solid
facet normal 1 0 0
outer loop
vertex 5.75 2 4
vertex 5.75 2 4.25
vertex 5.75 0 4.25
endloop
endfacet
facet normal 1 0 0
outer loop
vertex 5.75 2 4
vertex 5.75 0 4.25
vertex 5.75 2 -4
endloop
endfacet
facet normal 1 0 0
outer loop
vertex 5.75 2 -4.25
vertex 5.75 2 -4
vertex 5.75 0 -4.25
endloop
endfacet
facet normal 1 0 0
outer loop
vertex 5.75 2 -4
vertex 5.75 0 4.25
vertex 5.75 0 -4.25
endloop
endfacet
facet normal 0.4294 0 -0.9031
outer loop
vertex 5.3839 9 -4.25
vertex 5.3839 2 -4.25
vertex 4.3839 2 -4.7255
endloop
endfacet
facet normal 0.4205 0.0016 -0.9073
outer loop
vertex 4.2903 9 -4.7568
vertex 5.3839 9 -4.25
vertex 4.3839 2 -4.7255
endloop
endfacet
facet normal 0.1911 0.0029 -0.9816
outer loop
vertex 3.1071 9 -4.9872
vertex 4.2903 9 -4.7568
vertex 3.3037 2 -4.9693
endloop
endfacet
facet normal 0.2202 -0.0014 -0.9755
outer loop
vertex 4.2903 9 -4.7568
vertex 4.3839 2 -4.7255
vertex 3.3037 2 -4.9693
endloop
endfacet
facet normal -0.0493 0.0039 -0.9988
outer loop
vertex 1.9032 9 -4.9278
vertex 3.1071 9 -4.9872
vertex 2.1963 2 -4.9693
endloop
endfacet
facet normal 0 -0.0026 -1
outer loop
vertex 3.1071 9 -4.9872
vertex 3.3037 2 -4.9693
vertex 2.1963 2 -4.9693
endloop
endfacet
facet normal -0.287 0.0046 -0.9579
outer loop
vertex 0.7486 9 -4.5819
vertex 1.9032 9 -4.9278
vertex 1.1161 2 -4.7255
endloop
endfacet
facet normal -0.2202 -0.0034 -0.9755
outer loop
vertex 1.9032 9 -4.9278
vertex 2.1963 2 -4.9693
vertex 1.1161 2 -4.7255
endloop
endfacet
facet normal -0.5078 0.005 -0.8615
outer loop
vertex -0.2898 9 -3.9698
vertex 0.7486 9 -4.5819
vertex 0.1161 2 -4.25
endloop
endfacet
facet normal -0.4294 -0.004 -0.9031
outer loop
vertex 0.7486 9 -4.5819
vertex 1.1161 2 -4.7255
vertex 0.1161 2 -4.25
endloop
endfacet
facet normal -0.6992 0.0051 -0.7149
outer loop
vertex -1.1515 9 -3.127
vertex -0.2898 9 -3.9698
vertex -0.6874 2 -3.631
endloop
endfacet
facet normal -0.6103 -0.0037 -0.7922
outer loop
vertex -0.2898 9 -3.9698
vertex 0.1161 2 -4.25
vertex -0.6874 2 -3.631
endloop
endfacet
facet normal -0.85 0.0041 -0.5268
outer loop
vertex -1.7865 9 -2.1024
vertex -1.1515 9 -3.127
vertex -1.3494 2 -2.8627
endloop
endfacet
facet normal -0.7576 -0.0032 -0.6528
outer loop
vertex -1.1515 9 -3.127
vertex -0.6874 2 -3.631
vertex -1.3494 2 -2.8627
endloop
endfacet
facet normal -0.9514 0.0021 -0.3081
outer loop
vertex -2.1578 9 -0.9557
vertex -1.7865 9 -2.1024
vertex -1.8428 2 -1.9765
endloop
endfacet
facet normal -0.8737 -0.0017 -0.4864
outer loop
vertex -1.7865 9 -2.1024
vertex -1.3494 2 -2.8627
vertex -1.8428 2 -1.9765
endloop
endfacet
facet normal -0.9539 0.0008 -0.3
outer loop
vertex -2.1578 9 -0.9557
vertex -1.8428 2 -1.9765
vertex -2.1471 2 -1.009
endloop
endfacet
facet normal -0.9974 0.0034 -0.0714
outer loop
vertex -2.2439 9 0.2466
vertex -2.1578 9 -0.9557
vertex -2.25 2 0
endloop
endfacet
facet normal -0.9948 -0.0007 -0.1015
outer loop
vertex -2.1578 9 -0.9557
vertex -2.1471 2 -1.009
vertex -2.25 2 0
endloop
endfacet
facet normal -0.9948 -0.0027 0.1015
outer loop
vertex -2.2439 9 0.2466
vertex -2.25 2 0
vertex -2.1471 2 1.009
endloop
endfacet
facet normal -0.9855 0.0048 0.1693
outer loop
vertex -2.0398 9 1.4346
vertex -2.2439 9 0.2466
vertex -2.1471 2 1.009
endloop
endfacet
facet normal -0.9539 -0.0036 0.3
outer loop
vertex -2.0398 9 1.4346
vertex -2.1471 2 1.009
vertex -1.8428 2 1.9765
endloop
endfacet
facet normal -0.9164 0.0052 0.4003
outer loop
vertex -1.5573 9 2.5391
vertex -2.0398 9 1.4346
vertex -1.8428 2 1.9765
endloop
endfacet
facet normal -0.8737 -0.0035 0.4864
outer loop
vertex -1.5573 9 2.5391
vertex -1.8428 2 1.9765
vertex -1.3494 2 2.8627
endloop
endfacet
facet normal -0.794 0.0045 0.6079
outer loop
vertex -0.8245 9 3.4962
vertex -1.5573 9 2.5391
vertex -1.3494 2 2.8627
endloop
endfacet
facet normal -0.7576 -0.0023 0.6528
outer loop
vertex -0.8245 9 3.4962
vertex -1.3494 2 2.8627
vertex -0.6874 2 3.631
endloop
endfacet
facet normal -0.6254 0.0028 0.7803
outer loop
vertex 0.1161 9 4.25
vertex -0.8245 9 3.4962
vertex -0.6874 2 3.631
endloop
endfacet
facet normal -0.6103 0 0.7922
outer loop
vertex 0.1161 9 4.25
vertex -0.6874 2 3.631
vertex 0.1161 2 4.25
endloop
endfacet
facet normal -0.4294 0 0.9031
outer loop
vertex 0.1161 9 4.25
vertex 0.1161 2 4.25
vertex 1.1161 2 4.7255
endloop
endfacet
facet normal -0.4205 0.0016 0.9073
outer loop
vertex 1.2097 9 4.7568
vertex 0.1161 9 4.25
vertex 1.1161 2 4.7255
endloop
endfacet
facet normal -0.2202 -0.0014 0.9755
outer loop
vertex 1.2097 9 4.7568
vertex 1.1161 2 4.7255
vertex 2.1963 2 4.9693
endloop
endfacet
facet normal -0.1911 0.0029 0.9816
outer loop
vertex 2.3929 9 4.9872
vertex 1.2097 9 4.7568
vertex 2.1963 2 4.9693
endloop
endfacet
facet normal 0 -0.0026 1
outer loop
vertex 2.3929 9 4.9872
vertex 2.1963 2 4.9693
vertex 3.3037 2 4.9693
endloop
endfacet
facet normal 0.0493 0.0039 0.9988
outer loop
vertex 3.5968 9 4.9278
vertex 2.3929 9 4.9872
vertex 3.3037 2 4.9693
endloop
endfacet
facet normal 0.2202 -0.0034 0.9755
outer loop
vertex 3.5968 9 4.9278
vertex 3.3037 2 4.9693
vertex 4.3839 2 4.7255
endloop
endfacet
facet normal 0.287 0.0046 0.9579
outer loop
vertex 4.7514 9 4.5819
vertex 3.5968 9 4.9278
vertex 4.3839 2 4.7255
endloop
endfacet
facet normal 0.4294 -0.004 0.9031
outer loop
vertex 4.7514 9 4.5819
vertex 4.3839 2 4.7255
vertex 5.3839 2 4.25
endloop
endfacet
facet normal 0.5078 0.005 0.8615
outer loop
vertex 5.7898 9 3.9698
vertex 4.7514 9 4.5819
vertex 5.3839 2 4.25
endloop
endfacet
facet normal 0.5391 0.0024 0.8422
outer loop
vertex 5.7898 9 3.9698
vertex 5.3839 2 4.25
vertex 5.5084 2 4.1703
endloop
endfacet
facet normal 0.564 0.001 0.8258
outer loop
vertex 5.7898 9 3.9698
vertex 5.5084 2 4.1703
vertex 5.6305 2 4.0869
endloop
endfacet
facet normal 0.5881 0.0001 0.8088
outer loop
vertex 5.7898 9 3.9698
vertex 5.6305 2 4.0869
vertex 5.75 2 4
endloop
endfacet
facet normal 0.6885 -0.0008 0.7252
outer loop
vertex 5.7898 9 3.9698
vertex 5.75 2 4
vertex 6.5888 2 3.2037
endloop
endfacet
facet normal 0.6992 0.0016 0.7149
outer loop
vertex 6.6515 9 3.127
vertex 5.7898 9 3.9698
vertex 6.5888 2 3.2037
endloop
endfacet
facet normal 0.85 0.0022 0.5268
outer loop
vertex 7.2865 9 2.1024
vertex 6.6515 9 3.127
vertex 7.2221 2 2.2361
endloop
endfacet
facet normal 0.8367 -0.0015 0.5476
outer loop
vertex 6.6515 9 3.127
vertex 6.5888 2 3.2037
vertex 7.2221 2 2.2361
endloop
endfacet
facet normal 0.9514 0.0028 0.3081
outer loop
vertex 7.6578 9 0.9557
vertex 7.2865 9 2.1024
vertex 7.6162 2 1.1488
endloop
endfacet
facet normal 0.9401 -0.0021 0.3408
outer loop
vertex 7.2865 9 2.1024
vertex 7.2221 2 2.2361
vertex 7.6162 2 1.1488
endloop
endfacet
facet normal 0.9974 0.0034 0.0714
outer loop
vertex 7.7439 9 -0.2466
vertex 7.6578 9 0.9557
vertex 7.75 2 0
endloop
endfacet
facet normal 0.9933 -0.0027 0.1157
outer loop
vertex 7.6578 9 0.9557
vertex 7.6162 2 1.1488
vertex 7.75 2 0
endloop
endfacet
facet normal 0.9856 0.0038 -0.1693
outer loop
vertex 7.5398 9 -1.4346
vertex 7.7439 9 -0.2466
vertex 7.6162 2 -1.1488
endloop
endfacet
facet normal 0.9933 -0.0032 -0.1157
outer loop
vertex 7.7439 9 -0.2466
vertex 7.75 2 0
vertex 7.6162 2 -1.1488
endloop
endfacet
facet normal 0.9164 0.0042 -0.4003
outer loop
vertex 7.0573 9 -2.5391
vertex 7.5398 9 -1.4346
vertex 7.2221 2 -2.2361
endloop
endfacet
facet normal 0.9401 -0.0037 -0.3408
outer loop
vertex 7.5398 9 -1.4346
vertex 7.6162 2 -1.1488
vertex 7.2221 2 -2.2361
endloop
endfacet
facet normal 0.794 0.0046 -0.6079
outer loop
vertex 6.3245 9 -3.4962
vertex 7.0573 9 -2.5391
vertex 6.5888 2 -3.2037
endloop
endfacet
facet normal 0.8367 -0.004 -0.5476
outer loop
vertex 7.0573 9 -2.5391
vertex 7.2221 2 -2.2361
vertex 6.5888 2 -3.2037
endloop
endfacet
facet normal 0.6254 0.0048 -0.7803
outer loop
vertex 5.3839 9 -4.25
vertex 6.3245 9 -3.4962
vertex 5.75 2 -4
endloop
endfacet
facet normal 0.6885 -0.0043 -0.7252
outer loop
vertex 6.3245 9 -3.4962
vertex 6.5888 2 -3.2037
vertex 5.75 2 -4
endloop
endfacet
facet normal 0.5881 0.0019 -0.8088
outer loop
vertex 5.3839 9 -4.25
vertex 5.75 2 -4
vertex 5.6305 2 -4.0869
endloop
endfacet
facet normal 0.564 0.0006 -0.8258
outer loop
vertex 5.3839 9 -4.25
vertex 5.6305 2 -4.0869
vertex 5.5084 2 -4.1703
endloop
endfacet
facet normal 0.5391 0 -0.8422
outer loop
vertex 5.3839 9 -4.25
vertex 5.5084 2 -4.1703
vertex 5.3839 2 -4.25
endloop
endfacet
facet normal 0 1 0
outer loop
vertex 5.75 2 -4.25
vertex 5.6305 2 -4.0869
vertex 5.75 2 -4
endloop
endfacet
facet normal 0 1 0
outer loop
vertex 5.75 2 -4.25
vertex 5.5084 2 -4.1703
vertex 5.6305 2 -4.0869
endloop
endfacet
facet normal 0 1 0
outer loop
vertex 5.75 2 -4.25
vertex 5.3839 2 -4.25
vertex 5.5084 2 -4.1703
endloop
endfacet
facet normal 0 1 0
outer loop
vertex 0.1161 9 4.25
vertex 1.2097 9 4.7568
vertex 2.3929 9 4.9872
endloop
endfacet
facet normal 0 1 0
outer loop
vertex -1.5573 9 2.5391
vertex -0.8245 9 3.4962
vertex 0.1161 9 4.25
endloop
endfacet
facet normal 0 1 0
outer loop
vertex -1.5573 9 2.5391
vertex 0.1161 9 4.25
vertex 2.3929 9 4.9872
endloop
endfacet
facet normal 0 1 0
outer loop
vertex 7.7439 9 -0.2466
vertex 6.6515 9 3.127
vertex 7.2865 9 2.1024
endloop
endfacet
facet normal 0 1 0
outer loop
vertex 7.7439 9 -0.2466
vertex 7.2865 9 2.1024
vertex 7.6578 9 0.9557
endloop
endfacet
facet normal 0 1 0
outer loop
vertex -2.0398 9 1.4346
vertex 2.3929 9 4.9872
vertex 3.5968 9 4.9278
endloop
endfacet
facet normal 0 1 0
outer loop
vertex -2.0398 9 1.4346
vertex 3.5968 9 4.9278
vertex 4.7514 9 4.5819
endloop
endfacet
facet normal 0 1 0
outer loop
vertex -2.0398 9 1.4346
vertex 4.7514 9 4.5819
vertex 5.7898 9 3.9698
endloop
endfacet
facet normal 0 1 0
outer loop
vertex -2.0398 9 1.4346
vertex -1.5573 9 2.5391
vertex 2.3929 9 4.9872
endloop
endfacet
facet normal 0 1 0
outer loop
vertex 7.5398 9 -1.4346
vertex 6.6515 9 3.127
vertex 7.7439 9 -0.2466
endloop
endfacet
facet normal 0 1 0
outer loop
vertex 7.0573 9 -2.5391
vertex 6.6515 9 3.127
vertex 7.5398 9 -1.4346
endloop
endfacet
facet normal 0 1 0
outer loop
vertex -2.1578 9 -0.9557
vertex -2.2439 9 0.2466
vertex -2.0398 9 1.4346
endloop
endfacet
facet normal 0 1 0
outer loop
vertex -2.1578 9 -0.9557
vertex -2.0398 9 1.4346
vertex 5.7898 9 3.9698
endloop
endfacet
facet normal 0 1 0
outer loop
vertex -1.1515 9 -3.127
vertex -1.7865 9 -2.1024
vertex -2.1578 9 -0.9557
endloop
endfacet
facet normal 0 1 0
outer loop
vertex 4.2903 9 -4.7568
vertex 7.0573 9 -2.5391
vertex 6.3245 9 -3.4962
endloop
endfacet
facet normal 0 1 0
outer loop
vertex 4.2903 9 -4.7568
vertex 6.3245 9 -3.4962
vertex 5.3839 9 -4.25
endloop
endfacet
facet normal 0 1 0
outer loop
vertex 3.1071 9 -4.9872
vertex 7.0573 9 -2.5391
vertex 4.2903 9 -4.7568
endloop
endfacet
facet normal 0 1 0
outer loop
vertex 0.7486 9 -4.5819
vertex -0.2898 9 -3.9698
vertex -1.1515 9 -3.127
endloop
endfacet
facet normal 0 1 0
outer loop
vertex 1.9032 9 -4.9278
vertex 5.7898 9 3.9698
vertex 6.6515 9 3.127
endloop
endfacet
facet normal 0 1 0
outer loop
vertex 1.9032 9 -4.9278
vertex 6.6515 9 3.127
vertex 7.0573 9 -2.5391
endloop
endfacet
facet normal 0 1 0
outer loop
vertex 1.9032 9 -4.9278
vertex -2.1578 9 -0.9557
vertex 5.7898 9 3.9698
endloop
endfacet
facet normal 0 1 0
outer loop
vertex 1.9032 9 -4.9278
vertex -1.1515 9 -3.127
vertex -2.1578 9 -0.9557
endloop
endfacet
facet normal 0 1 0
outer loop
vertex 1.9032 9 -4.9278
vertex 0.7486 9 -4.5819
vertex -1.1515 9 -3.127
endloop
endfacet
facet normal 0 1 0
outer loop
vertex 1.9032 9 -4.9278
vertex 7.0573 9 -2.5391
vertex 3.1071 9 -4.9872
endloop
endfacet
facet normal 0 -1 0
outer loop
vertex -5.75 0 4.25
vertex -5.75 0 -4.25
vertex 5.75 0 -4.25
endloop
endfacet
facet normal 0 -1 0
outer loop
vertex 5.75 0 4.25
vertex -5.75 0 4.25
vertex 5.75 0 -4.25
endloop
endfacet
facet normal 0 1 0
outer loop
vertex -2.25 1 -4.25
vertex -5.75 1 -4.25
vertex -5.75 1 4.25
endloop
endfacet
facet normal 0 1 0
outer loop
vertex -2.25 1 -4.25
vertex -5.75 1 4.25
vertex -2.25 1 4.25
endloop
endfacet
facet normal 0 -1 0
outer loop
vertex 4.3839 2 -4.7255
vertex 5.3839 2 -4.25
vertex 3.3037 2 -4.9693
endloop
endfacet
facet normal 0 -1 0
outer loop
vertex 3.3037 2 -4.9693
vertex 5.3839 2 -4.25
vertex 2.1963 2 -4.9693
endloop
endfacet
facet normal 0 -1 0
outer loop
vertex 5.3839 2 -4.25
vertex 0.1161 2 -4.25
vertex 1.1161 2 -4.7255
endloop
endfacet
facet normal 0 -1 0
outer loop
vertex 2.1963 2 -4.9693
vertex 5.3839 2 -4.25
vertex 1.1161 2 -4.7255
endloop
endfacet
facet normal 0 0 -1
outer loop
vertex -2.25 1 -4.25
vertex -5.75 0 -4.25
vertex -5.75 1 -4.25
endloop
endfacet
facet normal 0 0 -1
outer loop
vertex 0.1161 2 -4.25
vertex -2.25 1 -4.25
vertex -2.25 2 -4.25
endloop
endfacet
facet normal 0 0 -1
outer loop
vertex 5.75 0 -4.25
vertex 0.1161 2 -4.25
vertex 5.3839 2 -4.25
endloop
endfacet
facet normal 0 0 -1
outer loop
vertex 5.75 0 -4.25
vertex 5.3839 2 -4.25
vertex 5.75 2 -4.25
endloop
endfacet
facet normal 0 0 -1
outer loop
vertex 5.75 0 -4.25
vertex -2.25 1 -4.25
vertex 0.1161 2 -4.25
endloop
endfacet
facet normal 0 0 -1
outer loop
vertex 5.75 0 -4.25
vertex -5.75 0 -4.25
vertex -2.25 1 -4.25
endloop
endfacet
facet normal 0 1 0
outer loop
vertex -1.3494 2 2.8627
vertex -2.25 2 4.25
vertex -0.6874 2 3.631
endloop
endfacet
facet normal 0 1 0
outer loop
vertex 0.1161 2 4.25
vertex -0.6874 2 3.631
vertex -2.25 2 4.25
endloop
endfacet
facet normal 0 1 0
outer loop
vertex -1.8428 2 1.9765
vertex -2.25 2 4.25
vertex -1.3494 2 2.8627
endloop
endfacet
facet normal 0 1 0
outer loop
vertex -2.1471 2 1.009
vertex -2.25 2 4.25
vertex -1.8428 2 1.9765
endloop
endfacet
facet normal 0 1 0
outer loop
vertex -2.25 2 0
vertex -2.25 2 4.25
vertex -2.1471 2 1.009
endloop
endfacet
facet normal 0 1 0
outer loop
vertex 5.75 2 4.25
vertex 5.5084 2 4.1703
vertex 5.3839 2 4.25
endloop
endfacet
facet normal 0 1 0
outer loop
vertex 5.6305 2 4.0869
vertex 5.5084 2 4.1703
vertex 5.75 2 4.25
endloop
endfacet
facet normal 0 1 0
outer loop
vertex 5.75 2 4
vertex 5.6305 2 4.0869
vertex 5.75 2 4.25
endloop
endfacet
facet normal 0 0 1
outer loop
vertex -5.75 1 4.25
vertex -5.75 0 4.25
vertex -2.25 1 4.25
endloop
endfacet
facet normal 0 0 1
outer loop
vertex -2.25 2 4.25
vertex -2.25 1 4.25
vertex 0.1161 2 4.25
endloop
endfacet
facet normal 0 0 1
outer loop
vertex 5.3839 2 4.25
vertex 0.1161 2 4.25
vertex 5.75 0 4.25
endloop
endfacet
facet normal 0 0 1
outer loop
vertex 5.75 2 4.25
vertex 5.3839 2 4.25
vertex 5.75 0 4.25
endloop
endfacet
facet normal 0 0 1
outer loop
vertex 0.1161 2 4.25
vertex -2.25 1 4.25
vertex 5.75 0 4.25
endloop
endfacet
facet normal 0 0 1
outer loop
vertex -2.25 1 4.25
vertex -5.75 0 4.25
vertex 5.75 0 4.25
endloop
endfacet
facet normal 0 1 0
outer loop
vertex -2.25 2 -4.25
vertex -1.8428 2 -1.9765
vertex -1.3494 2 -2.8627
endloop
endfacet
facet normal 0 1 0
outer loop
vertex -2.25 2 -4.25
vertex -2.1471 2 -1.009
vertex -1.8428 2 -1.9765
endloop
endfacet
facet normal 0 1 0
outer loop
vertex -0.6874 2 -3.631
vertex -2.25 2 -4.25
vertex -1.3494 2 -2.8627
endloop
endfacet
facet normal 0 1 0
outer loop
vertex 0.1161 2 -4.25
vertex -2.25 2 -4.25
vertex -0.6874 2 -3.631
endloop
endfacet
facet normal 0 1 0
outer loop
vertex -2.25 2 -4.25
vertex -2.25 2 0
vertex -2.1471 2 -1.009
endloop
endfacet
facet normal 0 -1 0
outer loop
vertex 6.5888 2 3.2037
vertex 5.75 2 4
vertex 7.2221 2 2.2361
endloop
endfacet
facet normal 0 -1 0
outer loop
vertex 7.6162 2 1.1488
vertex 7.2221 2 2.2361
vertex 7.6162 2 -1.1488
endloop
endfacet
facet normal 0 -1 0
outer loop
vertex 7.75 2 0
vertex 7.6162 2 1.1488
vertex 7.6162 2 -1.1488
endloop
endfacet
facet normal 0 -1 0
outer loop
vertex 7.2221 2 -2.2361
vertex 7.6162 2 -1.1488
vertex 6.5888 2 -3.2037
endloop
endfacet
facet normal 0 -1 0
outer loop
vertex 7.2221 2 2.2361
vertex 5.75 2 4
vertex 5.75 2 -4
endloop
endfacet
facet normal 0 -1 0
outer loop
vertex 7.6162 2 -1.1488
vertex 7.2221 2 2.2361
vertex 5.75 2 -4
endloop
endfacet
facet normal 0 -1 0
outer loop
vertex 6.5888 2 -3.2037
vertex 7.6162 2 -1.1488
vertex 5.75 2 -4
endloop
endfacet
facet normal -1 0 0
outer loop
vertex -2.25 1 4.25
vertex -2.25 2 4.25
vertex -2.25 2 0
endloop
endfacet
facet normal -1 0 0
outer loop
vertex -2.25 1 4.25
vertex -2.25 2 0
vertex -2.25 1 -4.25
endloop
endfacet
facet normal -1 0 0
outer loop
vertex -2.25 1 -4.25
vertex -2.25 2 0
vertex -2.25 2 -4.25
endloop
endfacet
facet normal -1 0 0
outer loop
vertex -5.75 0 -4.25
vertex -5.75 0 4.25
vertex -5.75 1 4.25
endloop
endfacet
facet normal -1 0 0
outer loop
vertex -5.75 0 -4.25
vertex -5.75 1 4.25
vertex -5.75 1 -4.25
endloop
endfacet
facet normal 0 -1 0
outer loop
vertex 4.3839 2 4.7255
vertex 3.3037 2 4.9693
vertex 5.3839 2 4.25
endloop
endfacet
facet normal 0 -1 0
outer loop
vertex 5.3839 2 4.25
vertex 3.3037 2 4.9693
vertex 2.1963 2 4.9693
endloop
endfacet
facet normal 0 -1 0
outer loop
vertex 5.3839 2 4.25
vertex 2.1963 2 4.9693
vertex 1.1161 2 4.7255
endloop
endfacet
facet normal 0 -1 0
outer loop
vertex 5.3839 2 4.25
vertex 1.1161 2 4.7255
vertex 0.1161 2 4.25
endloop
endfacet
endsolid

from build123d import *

# Parameters (mm, degrees)
SKETCH1_W           = 11.5
SKETCH1_H           = 8.5
BOSS_EXTRUDE1_DEPTH = 2
SKETCH2_R           = 5
BOSS_EXTRUDE2_DEPTH = 7
SKETCH3_W           = 3.5
SKETCH3_H           = 8.5
CUT_EXTRUDE1_DEPTH  = 1


with BuildPart() as part:
    # Sketch1 → Boss-Extrude1 (new body)
    with BuildSketch(Plane(origin=(0, 0, 0), x_dir=(1, 0, 0), z_dir=(0, 1, 0))):
        Rectangle(SKETCH1_W, SKETCH1_H)
    extrude(amount=BOSS_EXTRUDE1_DEPTH)

    # Sketch2 → Boss-Extrude2 (add)
    with BuildSketch(Plane(origin=(0, 2, 0), x_dir=(1, 0, 0), z_dir=(0, 1, 0))):
        with Locations(Location((2.75, 0, 0), (0, 0, 58.211669383))):
            Circle(SKETCH2_R)
    extrude(amount=BOSS_EXTRUDE2_DEPTH)

    # Sketch3 → Cut-Extrude1 (cut)
    with BuildSketch(Plane(origin=(0, 2, 0), x_dir=(1, 0, 0), z_dir=(0, 1, 0))):
        with Locations((-4, 0)):
            Rectangle(SKETCH3_W, SKETCH3_H)
    extrude(amount=-CUT_EXTRUDE1_DEPTH, mode=Mode.SUBTRACT)


solid = part.part
